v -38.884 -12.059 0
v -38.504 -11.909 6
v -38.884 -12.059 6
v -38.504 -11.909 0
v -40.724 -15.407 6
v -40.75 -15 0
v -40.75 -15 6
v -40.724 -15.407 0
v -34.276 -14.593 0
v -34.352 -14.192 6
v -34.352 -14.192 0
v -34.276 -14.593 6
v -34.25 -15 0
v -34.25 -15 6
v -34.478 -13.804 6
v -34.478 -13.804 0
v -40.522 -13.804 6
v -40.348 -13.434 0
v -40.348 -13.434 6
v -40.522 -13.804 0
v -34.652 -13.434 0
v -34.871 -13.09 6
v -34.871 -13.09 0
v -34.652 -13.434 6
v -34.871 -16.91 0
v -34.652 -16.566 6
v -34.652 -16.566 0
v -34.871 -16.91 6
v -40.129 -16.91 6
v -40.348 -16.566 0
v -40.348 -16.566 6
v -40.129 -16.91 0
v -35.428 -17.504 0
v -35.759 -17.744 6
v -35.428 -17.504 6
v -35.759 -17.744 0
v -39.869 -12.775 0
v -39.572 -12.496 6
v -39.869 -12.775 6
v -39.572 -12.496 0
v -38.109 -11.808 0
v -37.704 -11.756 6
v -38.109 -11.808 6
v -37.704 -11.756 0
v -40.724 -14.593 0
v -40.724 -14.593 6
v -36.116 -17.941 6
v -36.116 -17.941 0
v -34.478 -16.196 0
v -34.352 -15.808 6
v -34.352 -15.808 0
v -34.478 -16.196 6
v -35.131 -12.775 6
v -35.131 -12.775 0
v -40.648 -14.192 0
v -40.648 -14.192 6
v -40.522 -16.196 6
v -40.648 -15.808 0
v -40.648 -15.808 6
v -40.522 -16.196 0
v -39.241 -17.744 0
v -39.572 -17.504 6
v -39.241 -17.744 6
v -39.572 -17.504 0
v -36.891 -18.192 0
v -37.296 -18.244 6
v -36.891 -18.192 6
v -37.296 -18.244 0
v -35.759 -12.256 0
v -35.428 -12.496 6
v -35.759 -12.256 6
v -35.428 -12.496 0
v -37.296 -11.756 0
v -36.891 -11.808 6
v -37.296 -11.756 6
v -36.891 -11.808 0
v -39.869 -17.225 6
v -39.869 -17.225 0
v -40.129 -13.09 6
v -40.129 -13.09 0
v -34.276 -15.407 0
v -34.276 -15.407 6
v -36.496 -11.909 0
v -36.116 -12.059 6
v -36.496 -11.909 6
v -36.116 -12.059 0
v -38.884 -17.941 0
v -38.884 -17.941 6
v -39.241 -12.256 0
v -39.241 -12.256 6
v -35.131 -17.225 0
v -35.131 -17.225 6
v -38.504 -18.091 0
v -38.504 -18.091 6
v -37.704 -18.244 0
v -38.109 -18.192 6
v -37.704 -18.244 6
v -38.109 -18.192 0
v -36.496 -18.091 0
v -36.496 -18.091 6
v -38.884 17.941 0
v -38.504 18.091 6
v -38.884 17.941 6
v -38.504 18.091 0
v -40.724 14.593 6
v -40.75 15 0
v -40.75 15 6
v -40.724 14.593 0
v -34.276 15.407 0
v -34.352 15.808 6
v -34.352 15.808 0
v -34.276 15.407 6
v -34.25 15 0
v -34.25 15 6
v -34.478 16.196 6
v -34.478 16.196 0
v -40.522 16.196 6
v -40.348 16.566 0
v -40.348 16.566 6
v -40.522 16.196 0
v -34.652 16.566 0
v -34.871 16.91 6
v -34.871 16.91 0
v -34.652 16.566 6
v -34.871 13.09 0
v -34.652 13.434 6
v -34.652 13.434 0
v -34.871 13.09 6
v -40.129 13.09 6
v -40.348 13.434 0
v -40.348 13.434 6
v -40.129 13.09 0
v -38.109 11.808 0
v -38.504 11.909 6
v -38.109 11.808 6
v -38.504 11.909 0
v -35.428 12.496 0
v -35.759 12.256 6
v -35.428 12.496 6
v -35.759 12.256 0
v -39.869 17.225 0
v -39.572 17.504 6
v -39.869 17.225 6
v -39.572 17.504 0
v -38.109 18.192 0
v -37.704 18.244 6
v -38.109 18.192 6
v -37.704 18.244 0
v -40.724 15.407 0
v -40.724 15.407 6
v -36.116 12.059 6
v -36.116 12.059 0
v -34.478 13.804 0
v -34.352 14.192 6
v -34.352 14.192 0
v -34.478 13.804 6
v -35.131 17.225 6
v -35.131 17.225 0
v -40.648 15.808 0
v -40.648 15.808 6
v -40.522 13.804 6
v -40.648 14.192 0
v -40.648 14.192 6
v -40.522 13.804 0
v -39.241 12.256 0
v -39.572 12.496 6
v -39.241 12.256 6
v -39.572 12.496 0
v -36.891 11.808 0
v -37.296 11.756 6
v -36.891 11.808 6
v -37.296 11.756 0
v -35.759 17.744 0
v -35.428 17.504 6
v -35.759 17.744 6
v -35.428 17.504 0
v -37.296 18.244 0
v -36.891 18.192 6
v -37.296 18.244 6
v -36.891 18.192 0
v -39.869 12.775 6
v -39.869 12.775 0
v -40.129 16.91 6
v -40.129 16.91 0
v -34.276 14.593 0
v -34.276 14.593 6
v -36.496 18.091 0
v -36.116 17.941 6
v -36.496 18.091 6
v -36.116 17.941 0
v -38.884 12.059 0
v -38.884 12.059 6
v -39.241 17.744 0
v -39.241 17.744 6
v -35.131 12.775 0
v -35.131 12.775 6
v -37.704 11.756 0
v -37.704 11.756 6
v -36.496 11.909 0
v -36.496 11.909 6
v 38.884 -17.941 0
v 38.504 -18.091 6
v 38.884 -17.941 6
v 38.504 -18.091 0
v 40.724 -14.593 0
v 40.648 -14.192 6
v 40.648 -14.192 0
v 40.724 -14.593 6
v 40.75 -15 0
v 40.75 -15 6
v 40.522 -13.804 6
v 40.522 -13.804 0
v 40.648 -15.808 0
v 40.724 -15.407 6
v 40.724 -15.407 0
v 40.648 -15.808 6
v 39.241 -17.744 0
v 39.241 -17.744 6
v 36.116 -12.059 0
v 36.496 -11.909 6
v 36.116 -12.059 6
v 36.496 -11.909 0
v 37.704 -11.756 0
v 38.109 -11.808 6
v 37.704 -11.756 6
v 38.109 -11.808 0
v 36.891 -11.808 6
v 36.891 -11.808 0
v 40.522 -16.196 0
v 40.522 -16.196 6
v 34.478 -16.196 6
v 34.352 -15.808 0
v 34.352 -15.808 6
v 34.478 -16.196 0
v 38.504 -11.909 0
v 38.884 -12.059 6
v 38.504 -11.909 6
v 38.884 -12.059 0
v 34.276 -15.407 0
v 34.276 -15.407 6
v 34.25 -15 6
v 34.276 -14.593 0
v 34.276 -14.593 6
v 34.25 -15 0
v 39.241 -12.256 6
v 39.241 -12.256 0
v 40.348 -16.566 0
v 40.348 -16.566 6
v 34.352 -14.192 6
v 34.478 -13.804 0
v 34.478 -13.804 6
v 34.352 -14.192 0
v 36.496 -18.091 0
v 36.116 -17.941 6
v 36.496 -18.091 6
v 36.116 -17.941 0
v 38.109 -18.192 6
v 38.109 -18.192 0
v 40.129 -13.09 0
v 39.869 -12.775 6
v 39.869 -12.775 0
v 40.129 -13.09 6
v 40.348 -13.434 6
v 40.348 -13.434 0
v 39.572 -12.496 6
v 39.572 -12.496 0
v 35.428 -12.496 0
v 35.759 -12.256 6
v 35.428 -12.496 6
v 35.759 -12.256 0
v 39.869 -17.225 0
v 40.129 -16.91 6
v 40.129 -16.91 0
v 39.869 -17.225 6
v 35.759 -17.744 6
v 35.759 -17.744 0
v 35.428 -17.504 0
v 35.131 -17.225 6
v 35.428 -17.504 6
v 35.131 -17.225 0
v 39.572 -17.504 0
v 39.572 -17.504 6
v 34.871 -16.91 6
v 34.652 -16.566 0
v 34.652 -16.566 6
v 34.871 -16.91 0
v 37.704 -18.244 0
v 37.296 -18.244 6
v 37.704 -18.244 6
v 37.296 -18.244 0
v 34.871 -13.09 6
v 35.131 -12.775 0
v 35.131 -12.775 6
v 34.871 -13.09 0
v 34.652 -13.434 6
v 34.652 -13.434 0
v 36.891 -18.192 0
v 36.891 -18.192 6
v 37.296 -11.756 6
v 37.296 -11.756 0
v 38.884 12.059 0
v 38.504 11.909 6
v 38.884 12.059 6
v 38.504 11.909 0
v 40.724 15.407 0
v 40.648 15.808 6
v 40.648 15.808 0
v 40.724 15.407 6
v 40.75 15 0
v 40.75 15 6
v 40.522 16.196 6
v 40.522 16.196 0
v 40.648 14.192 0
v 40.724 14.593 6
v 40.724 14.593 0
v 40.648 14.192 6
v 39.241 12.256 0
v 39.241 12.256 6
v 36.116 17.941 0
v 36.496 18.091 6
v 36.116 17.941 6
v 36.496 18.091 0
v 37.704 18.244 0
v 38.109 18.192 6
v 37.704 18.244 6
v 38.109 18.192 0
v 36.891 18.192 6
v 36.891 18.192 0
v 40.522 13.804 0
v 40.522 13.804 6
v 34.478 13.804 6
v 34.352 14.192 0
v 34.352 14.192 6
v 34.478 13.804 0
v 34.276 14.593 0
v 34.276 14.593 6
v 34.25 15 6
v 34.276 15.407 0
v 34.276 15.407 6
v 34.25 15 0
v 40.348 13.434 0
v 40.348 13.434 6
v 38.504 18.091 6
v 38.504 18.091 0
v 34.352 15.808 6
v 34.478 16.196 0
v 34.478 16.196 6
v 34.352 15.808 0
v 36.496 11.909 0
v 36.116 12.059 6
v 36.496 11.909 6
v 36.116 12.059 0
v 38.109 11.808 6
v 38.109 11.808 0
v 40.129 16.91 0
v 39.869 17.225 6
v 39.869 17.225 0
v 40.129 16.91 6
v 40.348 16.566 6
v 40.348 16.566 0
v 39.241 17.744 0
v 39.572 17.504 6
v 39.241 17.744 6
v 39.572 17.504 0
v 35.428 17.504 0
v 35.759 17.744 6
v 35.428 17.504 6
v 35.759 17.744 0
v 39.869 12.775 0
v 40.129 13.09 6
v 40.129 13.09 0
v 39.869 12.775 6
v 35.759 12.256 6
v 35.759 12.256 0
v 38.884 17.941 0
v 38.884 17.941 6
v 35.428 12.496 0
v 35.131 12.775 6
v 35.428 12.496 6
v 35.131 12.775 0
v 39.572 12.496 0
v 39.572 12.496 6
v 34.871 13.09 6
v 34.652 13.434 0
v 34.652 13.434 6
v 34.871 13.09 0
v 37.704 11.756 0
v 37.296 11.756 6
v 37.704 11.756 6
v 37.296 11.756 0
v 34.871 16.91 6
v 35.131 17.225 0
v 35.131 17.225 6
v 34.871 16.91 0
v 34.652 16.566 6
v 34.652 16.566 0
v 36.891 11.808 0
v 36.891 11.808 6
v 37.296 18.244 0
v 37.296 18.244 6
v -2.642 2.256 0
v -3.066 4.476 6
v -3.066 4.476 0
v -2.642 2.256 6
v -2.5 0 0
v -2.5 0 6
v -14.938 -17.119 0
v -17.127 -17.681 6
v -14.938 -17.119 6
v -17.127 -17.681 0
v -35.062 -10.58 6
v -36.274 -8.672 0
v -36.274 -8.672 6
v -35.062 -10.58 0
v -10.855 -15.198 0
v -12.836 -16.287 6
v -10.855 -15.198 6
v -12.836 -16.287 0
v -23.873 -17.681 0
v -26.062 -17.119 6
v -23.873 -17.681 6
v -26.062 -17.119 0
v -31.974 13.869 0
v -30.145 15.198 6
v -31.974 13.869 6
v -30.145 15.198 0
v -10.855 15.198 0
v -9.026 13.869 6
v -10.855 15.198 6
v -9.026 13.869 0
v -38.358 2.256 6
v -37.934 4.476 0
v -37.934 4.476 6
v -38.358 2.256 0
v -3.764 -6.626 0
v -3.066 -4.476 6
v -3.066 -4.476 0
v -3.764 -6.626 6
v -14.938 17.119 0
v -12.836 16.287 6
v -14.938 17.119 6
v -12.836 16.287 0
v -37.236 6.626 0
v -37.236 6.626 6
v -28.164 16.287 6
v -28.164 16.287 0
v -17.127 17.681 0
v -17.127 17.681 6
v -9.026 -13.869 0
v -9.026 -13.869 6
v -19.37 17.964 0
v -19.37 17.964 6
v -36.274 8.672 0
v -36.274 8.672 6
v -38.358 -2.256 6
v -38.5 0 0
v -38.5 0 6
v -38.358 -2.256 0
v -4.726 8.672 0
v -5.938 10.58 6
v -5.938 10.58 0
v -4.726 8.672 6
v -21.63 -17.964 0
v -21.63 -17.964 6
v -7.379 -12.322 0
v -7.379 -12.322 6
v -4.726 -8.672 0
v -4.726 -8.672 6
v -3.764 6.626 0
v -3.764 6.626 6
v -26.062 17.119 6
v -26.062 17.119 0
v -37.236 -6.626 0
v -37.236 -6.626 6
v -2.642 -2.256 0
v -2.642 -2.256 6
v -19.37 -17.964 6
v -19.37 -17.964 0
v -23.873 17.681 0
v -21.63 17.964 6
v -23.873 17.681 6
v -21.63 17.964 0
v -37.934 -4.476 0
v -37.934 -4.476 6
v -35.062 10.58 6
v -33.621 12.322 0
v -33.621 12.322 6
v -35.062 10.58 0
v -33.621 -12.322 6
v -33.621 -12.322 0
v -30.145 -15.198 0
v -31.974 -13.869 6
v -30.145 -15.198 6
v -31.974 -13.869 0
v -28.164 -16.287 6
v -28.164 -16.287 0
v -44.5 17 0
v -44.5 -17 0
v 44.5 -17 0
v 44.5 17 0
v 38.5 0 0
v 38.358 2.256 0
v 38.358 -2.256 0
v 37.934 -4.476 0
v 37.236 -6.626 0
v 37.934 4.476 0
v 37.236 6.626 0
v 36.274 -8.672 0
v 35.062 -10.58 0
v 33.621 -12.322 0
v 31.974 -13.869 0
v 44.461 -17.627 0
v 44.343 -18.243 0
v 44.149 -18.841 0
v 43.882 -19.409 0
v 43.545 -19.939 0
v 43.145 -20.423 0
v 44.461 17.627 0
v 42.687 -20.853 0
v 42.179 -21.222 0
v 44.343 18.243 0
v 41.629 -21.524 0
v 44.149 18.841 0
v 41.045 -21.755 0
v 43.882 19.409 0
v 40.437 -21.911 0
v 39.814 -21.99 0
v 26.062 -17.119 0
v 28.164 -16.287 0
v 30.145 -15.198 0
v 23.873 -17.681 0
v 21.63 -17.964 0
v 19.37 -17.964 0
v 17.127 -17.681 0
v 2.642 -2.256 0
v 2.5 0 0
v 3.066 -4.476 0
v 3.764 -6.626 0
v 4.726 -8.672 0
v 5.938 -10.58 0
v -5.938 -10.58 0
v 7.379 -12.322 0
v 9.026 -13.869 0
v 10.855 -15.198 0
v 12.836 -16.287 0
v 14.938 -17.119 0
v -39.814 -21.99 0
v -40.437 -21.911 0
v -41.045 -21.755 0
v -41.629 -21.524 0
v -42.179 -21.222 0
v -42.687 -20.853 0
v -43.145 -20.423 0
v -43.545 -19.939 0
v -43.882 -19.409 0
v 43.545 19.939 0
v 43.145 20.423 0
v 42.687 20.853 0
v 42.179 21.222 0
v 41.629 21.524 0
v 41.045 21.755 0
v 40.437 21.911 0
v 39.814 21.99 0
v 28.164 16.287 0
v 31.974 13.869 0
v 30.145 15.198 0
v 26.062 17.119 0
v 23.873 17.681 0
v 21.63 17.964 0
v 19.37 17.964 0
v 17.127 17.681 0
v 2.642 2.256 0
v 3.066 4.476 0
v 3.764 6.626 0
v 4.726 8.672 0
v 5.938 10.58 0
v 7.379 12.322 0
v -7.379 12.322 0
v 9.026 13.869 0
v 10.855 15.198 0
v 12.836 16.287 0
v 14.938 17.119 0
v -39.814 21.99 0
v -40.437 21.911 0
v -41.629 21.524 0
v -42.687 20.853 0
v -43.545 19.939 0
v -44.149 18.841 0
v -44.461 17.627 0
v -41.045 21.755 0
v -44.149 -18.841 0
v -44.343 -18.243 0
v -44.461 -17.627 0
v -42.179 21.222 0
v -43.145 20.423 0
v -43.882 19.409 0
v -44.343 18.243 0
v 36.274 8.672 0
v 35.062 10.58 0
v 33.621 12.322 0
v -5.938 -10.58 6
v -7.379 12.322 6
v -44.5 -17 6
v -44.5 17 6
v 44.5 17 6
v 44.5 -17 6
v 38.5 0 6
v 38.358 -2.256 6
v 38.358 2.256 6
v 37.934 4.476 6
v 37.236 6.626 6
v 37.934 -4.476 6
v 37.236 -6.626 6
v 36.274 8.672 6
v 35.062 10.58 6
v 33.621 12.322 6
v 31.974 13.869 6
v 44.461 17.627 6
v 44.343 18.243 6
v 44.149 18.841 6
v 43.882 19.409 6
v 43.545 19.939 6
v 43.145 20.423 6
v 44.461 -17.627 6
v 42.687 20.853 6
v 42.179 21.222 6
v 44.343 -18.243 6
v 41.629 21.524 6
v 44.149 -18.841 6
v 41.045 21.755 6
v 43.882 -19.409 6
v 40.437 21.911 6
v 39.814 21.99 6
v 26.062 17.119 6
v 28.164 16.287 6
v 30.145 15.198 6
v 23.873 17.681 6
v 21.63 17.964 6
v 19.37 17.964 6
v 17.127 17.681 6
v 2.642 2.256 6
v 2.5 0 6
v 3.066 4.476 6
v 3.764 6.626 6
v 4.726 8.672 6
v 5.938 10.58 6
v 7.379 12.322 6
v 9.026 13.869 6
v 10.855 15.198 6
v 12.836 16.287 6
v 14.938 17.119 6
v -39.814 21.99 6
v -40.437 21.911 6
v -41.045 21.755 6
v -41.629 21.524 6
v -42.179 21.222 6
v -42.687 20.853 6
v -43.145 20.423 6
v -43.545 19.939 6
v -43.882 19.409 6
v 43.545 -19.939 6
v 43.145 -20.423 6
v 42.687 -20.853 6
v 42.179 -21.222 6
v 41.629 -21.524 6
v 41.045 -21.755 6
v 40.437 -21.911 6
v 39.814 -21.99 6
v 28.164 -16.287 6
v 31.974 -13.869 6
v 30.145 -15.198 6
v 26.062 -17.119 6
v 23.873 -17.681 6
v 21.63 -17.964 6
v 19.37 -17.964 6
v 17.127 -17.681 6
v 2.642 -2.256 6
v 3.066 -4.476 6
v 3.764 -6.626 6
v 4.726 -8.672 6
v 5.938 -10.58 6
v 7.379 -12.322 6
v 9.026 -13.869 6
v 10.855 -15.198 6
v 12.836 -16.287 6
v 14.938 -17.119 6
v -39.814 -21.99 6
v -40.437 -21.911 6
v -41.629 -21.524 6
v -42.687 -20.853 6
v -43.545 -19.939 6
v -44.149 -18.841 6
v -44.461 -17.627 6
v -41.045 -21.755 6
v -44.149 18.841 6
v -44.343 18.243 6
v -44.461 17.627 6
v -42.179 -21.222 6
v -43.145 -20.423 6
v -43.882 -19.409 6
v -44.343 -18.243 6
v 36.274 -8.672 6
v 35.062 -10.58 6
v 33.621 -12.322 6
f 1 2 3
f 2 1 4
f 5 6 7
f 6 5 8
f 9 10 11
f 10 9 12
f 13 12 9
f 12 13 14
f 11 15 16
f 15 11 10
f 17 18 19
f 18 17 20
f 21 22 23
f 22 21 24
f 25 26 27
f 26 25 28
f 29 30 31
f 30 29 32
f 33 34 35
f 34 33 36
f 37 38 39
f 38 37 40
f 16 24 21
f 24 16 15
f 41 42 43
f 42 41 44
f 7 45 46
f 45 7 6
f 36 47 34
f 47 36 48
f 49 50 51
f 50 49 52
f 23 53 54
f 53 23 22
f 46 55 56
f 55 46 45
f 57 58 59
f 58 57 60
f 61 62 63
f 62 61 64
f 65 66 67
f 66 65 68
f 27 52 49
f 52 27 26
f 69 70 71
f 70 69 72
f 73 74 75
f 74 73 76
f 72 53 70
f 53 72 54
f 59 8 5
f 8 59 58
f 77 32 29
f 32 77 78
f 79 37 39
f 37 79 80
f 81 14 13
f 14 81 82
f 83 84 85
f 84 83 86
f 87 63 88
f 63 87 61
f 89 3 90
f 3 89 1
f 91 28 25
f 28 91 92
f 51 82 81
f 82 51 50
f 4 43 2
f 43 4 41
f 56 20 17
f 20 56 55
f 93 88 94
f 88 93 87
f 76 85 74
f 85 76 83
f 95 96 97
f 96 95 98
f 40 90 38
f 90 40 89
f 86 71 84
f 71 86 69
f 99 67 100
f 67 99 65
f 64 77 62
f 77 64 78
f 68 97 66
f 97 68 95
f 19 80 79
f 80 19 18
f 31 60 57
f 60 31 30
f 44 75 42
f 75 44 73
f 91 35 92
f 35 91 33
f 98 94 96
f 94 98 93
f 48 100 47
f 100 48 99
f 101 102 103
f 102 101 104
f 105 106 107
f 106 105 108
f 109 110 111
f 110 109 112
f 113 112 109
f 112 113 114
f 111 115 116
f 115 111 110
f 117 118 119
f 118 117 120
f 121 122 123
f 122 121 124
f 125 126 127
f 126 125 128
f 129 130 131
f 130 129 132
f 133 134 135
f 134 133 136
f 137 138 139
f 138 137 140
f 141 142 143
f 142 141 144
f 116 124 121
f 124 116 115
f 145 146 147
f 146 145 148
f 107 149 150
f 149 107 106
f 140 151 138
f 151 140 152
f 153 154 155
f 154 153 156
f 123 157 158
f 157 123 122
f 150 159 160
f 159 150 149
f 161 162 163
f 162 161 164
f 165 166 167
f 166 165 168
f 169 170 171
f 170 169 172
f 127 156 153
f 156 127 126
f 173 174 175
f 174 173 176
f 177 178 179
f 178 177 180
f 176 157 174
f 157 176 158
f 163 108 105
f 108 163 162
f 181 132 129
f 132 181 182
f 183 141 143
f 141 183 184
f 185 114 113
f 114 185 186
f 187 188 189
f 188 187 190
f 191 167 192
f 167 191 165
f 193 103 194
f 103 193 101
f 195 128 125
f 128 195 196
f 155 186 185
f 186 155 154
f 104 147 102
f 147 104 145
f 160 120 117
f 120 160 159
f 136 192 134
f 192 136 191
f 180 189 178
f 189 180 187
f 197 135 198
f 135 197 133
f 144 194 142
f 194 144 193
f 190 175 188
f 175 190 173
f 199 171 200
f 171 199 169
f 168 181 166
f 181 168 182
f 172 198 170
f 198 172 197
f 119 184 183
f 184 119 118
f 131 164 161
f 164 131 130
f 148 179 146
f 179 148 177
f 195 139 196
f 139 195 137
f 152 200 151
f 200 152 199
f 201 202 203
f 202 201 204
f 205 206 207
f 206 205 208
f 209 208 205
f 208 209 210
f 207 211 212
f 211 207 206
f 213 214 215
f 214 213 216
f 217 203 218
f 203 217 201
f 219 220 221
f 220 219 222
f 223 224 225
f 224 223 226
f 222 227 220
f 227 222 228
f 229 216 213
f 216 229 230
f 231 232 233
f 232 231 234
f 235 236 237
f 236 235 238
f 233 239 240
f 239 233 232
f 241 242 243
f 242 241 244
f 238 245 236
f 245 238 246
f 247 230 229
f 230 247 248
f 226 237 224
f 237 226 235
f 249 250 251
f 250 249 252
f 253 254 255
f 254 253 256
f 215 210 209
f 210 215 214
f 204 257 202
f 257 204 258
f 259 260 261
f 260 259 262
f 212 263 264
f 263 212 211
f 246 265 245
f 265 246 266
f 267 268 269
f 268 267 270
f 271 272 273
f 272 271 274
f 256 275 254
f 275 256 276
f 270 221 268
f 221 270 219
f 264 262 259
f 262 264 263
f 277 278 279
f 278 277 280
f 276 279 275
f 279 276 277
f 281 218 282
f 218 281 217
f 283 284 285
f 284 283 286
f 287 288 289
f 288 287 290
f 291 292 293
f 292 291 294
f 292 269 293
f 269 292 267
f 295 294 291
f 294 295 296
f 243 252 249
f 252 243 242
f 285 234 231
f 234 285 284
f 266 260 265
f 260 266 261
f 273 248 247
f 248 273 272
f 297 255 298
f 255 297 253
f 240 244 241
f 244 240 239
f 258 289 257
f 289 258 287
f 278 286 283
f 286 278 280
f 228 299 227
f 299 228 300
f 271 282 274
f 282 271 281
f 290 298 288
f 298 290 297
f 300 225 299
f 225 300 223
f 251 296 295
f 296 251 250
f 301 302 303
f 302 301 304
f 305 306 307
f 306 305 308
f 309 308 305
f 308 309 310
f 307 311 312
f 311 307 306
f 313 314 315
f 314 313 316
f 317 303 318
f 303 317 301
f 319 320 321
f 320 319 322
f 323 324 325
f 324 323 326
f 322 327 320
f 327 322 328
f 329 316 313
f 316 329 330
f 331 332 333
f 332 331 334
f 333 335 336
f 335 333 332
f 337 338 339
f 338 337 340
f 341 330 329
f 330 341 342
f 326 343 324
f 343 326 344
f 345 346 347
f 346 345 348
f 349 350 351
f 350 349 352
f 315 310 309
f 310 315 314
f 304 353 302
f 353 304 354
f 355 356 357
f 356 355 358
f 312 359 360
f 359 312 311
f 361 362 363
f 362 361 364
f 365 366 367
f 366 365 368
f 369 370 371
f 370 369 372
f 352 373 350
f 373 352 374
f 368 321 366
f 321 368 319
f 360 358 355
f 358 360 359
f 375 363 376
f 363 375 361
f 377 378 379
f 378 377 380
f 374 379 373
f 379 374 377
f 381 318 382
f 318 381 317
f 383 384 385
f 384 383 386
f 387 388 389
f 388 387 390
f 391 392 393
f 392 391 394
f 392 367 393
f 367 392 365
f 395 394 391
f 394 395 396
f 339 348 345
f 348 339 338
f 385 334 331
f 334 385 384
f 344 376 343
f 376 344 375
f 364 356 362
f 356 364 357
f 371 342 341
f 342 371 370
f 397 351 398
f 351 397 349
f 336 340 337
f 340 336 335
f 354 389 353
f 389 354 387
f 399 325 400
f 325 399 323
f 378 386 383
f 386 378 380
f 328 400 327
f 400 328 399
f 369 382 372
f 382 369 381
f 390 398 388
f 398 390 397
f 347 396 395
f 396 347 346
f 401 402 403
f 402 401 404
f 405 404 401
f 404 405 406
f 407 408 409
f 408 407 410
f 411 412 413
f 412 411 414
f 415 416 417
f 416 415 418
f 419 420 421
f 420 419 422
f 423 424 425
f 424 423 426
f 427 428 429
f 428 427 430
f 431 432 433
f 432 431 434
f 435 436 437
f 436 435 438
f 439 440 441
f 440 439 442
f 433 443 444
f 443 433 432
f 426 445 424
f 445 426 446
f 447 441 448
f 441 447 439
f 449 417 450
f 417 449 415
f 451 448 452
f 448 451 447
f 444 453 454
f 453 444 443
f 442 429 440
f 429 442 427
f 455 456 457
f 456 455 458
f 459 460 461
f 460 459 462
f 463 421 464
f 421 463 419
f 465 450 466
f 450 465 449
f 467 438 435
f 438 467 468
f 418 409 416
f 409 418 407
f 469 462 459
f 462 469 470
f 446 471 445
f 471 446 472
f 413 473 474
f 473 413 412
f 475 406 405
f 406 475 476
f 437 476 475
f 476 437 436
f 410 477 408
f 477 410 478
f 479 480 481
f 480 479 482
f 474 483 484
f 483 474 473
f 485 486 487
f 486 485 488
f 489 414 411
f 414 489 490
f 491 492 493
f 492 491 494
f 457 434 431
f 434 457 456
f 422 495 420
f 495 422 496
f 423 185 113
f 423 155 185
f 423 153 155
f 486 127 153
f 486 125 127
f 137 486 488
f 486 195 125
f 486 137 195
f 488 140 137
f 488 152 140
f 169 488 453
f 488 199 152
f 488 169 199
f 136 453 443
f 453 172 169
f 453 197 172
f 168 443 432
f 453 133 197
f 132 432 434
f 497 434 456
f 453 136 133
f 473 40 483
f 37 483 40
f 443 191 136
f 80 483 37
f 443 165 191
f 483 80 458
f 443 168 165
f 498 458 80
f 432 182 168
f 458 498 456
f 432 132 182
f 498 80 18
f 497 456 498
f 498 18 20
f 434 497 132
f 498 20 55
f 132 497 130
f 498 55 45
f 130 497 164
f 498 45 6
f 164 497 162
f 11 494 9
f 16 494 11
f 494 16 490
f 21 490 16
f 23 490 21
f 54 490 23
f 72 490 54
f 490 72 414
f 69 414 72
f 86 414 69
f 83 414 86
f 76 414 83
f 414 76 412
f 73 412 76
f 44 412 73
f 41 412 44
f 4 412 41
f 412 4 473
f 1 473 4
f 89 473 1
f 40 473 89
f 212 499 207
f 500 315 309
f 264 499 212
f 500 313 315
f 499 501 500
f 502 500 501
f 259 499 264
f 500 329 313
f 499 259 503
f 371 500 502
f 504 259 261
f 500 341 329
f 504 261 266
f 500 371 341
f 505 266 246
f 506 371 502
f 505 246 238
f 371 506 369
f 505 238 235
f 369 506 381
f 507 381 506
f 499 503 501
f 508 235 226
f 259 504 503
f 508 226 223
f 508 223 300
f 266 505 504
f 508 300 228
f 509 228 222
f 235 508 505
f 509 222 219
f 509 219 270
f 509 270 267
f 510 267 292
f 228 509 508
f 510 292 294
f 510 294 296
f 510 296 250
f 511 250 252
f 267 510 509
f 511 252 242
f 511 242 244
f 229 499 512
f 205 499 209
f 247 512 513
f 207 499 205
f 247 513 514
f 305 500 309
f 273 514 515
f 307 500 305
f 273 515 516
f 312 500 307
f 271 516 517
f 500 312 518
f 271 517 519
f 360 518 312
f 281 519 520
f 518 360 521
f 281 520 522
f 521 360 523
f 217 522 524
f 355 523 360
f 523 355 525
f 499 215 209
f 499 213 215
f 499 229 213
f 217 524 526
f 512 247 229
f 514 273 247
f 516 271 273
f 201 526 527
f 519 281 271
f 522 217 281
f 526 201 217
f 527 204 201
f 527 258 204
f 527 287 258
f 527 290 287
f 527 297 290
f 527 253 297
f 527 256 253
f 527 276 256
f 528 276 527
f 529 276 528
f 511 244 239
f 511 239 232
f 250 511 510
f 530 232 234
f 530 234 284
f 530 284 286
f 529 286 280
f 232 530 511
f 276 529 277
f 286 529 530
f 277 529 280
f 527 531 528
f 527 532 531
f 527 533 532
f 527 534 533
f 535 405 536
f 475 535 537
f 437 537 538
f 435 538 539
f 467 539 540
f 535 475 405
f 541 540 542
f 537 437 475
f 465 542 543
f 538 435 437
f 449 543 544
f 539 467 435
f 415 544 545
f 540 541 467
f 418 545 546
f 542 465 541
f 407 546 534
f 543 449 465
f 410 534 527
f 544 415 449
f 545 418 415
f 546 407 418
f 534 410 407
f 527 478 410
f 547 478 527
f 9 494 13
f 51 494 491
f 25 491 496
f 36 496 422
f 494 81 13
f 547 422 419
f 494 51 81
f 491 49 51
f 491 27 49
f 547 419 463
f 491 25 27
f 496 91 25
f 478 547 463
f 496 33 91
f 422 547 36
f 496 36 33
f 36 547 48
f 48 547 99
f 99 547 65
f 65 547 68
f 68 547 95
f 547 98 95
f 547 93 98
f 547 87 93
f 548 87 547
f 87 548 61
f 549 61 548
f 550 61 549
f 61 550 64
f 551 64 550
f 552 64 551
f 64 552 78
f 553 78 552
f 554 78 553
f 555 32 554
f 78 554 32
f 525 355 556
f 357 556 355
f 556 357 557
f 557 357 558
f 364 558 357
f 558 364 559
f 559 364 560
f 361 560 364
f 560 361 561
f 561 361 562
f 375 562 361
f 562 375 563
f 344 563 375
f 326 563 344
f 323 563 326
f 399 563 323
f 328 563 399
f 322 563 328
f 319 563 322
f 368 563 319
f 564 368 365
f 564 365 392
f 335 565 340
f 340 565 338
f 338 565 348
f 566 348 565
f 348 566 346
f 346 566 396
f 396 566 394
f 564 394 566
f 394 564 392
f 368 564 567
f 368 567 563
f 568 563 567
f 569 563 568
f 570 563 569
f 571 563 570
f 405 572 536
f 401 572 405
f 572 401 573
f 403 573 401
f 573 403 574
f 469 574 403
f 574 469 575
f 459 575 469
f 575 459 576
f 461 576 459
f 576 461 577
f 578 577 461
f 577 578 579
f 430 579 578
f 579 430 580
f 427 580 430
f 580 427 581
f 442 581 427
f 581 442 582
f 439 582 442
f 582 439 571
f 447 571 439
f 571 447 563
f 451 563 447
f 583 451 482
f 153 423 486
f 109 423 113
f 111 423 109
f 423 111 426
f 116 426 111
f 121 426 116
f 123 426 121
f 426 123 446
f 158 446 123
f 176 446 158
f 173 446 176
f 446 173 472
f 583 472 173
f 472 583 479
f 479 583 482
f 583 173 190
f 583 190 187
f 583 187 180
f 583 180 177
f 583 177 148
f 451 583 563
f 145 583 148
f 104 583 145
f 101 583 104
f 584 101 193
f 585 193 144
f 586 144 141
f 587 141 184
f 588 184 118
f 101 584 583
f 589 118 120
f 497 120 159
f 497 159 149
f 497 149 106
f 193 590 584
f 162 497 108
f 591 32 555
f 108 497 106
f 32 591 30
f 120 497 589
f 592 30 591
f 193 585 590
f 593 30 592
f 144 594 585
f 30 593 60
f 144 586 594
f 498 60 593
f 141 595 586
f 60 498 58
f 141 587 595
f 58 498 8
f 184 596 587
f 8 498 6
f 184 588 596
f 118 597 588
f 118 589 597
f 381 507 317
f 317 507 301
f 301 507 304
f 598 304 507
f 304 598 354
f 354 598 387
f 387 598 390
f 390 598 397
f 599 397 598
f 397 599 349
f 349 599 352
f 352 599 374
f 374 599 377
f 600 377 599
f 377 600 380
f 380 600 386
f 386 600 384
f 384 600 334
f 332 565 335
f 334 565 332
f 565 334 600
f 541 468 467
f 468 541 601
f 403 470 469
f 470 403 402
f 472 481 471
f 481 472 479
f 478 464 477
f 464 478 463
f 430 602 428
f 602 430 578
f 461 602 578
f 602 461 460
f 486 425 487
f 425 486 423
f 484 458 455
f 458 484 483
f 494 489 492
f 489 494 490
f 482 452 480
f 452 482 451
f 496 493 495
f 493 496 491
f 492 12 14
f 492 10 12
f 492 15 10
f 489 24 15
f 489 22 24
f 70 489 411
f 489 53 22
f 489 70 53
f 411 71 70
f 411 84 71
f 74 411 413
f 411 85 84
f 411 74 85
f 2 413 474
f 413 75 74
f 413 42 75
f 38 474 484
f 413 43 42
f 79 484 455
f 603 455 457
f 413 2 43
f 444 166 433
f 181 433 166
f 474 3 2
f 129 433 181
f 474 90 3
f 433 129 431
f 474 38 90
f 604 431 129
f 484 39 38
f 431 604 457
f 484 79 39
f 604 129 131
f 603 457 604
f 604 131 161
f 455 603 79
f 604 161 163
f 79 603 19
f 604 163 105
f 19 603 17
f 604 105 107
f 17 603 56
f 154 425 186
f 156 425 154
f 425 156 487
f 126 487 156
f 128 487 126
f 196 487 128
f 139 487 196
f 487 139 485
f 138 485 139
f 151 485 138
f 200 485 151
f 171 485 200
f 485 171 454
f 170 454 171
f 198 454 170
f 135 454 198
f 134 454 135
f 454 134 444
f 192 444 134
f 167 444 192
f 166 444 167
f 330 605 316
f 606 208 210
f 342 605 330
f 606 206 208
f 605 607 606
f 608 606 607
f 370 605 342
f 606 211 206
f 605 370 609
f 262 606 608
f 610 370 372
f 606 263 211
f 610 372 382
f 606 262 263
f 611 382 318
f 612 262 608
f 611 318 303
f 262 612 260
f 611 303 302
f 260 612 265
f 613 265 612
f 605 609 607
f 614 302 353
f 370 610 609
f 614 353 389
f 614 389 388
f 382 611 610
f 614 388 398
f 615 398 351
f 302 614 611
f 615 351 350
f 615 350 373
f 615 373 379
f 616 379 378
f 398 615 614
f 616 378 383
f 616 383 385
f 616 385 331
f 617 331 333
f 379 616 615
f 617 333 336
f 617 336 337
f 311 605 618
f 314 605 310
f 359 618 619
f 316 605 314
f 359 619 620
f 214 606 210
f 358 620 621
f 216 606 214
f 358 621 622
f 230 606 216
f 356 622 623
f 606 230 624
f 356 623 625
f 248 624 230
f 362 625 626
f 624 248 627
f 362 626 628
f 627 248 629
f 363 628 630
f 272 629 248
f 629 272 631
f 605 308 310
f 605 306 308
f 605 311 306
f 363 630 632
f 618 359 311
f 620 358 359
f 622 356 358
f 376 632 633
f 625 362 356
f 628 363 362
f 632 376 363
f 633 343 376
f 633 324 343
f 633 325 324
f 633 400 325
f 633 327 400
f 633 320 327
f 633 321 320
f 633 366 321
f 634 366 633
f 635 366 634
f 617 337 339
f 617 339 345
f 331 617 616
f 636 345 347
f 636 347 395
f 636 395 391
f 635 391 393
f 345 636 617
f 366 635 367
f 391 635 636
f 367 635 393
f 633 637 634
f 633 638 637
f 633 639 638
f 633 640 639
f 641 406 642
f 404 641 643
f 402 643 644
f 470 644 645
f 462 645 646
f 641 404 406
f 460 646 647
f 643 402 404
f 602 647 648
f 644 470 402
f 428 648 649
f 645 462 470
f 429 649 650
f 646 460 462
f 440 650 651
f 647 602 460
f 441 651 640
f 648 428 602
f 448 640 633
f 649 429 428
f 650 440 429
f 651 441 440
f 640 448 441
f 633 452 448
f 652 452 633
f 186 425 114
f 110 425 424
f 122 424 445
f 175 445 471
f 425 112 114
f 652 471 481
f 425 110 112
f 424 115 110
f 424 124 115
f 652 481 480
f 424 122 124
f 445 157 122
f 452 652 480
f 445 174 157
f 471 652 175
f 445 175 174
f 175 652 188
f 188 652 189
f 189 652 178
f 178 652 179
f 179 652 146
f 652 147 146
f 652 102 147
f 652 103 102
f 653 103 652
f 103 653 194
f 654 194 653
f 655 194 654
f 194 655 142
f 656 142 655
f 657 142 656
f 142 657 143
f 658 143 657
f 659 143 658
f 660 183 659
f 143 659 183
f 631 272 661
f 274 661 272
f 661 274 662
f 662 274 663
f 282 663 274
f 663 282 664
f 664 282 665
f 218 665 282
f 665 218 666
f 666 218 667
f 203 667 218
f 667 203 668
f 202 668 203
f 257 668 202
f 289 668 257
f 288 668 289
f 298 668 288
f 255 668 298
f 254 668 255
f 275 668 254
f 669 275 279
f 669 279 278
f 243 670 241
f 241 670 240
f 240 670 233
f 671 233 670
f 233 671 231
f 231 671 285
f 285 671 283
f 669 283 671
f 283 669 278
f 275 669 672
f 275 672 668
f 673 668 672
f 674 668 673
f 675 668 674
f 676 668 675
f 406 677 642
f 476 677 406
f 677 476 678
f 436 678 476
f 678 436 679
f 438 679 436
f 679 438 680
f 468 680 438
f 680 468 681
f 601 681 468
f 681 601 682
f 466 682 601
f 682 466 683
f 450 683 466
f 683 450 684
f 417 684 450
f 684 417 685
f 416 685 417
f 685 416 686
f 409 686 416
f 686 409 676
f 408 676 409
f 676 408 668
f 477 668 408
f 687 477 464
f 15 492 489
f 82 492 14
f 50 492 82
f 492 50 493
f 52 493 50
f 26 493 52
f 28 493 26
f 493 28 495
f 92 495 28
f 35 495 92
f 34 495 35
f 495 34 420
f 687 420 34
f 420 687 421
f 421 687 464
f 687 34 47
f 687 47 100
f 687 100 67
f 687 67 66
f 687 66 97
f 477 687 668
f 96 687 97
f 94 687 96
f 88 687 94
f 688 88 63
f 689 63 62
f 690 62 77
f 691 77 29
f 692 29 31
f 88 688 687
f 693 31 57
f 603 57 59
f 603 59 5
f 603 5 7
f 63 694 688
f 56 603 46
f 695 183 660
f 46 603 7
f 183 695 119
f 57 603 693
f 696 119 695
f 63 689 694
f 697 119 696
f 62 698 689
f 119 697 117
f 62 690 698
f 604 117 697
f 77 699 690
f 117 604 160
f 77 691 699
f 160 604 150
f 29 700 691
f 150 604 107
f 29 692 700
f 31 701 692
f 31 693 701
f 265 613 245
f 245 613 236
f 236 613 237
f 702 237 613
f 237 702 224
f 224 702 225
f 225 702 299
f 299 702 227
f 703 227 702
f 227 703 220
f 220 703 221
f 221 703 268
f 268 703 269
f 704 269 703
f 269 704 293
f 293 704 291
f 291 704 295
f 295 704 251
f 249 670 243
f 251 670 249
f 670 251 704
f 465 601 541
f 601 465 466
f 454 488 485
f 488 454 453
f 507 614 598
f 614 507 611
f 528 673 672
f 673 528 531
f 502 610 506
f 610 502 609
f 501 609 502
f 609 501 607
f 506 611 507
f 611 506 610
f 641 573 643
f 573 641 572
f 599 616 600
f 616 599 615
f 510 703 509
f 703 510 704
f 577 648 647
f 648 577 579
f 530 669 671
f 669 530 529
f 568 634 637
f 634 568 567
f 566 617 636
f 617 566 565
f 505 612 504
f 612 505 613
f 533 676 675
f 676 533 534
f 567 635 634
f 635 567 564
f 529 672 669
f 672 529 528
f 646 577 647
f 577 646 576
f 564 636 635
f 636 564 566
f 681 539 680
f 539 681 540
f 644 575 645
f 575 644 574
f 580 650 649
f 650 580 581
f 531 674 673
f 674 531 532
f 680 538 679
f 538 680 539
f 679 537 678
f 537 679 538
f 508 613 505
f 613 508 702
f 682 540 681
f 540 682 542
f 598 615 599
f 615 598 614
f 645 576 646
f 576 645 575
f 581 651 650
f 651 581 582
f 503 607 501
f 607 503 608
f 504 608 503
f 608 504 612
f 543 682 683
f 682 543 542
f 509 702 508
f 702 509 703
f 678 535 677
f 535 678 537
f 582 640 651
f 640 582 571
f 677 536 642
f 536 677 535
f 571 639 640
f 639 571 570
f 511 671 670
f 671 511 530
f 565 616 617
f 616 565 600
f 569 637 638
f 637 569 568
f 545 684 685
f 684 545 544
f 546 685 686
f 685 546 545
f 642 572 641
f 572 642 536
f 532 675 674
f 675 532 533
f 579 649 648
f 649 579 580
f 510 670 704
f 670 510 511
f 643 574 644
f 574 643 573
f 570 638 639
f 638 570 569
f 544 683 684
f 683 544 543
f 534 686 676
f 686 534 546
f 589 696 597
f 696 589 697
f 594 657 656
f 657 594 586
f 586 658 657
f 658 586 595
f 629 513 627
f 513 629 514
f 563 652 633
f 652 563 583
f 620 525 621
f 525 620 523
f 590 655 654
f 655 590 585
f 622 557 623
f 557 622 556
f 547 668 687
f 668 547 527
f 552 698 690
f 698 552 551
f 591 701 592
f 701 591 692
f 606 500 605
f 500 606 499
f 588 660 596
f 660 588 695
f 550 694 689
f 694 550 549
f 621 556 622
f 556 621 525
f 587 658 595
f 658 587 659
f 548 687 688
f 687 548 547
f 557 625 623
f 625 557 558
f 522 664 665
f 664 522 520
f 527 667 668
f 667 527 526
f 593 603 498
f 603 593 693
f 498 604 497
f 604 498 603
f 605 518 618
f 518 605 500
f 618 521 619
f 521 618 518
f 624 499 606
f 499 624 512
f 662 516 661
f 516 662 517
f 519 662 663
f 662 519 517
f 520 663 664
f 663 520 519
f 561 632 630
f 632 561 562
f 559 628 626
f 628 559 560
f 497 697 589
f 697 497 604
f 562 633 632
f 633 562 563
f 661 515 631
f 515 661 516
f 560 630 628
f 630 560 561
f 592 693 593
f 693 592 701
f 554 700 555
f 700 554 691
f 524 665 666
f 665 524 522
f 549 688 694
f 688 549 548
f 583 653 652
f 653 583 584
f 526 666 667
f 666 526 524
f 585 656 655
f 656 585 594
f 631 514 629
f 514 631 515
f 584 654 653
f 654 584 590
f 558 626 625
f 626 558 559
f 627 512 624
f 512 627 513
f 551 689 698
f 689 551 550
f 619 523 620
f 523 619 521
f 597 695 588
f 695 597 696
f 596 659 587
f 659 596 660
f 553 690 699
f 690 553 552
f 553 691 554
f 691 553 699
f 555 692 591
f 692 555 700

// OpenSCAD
$fn = 50;

difference() {
	union() {
		hull() {
			translate(v = [-39.5, 17.0, 0]) {
				cylinder(h = 6, r = 5);
			}
			translate(v = [39.5, 17.0, 0]) {
				cylinder(h = 6, r = 5);
			}
			translate(v = [-39.5, -17.0, 0]) {
				cylinder(h = 6, r = 5);
			}
			translate(v = [39.5, -17.0, 0]) {
				cylinder(h = 6, r = 5);
			}
		}
	}
	union() {
		translate(v = [-37.5, -15.0, -100.0]) {
			cylinder(h = 200, r = 3.25);
		}
		translate(v = [-37.5, 15.0, -100.0]) {
			cylinder(h = 200, r = 3.25);
		}
		translate(v = [37.5, -15.0, -100.0]) {
			cylinder(h = 200, r = 3.25);
		}
		translate(v = [37.5, 15.0, -100.0]) {
			cylinder(h = 200, r = 3.25);
		}
		translate(v = [-37.5, -15.0, -100.0]) {
			cylinder(h = 200, r = 1.8);
		}
		translate(v = [-37.5, 15.0, -100.0]) {
			cylinder(h = 200, r = 1.8);
		}
		translate(v = [37.5, -15.0, -100.0]) {
			cylinder(h = 200, r = 1.8);
		}
		translate(v = [37.5, 15.0, -100.0]) {
			cylinder(h = 200, r = 1.8);
		}
		translate(v = [-20.5, 0, 0.0]) {
			cylinder(h = 6, r = 18.0);
		}
		translate(v = [20.5, 0, 0.0]) {
			cylinder(h = 6, r = 18.0);
		}
	}
}
